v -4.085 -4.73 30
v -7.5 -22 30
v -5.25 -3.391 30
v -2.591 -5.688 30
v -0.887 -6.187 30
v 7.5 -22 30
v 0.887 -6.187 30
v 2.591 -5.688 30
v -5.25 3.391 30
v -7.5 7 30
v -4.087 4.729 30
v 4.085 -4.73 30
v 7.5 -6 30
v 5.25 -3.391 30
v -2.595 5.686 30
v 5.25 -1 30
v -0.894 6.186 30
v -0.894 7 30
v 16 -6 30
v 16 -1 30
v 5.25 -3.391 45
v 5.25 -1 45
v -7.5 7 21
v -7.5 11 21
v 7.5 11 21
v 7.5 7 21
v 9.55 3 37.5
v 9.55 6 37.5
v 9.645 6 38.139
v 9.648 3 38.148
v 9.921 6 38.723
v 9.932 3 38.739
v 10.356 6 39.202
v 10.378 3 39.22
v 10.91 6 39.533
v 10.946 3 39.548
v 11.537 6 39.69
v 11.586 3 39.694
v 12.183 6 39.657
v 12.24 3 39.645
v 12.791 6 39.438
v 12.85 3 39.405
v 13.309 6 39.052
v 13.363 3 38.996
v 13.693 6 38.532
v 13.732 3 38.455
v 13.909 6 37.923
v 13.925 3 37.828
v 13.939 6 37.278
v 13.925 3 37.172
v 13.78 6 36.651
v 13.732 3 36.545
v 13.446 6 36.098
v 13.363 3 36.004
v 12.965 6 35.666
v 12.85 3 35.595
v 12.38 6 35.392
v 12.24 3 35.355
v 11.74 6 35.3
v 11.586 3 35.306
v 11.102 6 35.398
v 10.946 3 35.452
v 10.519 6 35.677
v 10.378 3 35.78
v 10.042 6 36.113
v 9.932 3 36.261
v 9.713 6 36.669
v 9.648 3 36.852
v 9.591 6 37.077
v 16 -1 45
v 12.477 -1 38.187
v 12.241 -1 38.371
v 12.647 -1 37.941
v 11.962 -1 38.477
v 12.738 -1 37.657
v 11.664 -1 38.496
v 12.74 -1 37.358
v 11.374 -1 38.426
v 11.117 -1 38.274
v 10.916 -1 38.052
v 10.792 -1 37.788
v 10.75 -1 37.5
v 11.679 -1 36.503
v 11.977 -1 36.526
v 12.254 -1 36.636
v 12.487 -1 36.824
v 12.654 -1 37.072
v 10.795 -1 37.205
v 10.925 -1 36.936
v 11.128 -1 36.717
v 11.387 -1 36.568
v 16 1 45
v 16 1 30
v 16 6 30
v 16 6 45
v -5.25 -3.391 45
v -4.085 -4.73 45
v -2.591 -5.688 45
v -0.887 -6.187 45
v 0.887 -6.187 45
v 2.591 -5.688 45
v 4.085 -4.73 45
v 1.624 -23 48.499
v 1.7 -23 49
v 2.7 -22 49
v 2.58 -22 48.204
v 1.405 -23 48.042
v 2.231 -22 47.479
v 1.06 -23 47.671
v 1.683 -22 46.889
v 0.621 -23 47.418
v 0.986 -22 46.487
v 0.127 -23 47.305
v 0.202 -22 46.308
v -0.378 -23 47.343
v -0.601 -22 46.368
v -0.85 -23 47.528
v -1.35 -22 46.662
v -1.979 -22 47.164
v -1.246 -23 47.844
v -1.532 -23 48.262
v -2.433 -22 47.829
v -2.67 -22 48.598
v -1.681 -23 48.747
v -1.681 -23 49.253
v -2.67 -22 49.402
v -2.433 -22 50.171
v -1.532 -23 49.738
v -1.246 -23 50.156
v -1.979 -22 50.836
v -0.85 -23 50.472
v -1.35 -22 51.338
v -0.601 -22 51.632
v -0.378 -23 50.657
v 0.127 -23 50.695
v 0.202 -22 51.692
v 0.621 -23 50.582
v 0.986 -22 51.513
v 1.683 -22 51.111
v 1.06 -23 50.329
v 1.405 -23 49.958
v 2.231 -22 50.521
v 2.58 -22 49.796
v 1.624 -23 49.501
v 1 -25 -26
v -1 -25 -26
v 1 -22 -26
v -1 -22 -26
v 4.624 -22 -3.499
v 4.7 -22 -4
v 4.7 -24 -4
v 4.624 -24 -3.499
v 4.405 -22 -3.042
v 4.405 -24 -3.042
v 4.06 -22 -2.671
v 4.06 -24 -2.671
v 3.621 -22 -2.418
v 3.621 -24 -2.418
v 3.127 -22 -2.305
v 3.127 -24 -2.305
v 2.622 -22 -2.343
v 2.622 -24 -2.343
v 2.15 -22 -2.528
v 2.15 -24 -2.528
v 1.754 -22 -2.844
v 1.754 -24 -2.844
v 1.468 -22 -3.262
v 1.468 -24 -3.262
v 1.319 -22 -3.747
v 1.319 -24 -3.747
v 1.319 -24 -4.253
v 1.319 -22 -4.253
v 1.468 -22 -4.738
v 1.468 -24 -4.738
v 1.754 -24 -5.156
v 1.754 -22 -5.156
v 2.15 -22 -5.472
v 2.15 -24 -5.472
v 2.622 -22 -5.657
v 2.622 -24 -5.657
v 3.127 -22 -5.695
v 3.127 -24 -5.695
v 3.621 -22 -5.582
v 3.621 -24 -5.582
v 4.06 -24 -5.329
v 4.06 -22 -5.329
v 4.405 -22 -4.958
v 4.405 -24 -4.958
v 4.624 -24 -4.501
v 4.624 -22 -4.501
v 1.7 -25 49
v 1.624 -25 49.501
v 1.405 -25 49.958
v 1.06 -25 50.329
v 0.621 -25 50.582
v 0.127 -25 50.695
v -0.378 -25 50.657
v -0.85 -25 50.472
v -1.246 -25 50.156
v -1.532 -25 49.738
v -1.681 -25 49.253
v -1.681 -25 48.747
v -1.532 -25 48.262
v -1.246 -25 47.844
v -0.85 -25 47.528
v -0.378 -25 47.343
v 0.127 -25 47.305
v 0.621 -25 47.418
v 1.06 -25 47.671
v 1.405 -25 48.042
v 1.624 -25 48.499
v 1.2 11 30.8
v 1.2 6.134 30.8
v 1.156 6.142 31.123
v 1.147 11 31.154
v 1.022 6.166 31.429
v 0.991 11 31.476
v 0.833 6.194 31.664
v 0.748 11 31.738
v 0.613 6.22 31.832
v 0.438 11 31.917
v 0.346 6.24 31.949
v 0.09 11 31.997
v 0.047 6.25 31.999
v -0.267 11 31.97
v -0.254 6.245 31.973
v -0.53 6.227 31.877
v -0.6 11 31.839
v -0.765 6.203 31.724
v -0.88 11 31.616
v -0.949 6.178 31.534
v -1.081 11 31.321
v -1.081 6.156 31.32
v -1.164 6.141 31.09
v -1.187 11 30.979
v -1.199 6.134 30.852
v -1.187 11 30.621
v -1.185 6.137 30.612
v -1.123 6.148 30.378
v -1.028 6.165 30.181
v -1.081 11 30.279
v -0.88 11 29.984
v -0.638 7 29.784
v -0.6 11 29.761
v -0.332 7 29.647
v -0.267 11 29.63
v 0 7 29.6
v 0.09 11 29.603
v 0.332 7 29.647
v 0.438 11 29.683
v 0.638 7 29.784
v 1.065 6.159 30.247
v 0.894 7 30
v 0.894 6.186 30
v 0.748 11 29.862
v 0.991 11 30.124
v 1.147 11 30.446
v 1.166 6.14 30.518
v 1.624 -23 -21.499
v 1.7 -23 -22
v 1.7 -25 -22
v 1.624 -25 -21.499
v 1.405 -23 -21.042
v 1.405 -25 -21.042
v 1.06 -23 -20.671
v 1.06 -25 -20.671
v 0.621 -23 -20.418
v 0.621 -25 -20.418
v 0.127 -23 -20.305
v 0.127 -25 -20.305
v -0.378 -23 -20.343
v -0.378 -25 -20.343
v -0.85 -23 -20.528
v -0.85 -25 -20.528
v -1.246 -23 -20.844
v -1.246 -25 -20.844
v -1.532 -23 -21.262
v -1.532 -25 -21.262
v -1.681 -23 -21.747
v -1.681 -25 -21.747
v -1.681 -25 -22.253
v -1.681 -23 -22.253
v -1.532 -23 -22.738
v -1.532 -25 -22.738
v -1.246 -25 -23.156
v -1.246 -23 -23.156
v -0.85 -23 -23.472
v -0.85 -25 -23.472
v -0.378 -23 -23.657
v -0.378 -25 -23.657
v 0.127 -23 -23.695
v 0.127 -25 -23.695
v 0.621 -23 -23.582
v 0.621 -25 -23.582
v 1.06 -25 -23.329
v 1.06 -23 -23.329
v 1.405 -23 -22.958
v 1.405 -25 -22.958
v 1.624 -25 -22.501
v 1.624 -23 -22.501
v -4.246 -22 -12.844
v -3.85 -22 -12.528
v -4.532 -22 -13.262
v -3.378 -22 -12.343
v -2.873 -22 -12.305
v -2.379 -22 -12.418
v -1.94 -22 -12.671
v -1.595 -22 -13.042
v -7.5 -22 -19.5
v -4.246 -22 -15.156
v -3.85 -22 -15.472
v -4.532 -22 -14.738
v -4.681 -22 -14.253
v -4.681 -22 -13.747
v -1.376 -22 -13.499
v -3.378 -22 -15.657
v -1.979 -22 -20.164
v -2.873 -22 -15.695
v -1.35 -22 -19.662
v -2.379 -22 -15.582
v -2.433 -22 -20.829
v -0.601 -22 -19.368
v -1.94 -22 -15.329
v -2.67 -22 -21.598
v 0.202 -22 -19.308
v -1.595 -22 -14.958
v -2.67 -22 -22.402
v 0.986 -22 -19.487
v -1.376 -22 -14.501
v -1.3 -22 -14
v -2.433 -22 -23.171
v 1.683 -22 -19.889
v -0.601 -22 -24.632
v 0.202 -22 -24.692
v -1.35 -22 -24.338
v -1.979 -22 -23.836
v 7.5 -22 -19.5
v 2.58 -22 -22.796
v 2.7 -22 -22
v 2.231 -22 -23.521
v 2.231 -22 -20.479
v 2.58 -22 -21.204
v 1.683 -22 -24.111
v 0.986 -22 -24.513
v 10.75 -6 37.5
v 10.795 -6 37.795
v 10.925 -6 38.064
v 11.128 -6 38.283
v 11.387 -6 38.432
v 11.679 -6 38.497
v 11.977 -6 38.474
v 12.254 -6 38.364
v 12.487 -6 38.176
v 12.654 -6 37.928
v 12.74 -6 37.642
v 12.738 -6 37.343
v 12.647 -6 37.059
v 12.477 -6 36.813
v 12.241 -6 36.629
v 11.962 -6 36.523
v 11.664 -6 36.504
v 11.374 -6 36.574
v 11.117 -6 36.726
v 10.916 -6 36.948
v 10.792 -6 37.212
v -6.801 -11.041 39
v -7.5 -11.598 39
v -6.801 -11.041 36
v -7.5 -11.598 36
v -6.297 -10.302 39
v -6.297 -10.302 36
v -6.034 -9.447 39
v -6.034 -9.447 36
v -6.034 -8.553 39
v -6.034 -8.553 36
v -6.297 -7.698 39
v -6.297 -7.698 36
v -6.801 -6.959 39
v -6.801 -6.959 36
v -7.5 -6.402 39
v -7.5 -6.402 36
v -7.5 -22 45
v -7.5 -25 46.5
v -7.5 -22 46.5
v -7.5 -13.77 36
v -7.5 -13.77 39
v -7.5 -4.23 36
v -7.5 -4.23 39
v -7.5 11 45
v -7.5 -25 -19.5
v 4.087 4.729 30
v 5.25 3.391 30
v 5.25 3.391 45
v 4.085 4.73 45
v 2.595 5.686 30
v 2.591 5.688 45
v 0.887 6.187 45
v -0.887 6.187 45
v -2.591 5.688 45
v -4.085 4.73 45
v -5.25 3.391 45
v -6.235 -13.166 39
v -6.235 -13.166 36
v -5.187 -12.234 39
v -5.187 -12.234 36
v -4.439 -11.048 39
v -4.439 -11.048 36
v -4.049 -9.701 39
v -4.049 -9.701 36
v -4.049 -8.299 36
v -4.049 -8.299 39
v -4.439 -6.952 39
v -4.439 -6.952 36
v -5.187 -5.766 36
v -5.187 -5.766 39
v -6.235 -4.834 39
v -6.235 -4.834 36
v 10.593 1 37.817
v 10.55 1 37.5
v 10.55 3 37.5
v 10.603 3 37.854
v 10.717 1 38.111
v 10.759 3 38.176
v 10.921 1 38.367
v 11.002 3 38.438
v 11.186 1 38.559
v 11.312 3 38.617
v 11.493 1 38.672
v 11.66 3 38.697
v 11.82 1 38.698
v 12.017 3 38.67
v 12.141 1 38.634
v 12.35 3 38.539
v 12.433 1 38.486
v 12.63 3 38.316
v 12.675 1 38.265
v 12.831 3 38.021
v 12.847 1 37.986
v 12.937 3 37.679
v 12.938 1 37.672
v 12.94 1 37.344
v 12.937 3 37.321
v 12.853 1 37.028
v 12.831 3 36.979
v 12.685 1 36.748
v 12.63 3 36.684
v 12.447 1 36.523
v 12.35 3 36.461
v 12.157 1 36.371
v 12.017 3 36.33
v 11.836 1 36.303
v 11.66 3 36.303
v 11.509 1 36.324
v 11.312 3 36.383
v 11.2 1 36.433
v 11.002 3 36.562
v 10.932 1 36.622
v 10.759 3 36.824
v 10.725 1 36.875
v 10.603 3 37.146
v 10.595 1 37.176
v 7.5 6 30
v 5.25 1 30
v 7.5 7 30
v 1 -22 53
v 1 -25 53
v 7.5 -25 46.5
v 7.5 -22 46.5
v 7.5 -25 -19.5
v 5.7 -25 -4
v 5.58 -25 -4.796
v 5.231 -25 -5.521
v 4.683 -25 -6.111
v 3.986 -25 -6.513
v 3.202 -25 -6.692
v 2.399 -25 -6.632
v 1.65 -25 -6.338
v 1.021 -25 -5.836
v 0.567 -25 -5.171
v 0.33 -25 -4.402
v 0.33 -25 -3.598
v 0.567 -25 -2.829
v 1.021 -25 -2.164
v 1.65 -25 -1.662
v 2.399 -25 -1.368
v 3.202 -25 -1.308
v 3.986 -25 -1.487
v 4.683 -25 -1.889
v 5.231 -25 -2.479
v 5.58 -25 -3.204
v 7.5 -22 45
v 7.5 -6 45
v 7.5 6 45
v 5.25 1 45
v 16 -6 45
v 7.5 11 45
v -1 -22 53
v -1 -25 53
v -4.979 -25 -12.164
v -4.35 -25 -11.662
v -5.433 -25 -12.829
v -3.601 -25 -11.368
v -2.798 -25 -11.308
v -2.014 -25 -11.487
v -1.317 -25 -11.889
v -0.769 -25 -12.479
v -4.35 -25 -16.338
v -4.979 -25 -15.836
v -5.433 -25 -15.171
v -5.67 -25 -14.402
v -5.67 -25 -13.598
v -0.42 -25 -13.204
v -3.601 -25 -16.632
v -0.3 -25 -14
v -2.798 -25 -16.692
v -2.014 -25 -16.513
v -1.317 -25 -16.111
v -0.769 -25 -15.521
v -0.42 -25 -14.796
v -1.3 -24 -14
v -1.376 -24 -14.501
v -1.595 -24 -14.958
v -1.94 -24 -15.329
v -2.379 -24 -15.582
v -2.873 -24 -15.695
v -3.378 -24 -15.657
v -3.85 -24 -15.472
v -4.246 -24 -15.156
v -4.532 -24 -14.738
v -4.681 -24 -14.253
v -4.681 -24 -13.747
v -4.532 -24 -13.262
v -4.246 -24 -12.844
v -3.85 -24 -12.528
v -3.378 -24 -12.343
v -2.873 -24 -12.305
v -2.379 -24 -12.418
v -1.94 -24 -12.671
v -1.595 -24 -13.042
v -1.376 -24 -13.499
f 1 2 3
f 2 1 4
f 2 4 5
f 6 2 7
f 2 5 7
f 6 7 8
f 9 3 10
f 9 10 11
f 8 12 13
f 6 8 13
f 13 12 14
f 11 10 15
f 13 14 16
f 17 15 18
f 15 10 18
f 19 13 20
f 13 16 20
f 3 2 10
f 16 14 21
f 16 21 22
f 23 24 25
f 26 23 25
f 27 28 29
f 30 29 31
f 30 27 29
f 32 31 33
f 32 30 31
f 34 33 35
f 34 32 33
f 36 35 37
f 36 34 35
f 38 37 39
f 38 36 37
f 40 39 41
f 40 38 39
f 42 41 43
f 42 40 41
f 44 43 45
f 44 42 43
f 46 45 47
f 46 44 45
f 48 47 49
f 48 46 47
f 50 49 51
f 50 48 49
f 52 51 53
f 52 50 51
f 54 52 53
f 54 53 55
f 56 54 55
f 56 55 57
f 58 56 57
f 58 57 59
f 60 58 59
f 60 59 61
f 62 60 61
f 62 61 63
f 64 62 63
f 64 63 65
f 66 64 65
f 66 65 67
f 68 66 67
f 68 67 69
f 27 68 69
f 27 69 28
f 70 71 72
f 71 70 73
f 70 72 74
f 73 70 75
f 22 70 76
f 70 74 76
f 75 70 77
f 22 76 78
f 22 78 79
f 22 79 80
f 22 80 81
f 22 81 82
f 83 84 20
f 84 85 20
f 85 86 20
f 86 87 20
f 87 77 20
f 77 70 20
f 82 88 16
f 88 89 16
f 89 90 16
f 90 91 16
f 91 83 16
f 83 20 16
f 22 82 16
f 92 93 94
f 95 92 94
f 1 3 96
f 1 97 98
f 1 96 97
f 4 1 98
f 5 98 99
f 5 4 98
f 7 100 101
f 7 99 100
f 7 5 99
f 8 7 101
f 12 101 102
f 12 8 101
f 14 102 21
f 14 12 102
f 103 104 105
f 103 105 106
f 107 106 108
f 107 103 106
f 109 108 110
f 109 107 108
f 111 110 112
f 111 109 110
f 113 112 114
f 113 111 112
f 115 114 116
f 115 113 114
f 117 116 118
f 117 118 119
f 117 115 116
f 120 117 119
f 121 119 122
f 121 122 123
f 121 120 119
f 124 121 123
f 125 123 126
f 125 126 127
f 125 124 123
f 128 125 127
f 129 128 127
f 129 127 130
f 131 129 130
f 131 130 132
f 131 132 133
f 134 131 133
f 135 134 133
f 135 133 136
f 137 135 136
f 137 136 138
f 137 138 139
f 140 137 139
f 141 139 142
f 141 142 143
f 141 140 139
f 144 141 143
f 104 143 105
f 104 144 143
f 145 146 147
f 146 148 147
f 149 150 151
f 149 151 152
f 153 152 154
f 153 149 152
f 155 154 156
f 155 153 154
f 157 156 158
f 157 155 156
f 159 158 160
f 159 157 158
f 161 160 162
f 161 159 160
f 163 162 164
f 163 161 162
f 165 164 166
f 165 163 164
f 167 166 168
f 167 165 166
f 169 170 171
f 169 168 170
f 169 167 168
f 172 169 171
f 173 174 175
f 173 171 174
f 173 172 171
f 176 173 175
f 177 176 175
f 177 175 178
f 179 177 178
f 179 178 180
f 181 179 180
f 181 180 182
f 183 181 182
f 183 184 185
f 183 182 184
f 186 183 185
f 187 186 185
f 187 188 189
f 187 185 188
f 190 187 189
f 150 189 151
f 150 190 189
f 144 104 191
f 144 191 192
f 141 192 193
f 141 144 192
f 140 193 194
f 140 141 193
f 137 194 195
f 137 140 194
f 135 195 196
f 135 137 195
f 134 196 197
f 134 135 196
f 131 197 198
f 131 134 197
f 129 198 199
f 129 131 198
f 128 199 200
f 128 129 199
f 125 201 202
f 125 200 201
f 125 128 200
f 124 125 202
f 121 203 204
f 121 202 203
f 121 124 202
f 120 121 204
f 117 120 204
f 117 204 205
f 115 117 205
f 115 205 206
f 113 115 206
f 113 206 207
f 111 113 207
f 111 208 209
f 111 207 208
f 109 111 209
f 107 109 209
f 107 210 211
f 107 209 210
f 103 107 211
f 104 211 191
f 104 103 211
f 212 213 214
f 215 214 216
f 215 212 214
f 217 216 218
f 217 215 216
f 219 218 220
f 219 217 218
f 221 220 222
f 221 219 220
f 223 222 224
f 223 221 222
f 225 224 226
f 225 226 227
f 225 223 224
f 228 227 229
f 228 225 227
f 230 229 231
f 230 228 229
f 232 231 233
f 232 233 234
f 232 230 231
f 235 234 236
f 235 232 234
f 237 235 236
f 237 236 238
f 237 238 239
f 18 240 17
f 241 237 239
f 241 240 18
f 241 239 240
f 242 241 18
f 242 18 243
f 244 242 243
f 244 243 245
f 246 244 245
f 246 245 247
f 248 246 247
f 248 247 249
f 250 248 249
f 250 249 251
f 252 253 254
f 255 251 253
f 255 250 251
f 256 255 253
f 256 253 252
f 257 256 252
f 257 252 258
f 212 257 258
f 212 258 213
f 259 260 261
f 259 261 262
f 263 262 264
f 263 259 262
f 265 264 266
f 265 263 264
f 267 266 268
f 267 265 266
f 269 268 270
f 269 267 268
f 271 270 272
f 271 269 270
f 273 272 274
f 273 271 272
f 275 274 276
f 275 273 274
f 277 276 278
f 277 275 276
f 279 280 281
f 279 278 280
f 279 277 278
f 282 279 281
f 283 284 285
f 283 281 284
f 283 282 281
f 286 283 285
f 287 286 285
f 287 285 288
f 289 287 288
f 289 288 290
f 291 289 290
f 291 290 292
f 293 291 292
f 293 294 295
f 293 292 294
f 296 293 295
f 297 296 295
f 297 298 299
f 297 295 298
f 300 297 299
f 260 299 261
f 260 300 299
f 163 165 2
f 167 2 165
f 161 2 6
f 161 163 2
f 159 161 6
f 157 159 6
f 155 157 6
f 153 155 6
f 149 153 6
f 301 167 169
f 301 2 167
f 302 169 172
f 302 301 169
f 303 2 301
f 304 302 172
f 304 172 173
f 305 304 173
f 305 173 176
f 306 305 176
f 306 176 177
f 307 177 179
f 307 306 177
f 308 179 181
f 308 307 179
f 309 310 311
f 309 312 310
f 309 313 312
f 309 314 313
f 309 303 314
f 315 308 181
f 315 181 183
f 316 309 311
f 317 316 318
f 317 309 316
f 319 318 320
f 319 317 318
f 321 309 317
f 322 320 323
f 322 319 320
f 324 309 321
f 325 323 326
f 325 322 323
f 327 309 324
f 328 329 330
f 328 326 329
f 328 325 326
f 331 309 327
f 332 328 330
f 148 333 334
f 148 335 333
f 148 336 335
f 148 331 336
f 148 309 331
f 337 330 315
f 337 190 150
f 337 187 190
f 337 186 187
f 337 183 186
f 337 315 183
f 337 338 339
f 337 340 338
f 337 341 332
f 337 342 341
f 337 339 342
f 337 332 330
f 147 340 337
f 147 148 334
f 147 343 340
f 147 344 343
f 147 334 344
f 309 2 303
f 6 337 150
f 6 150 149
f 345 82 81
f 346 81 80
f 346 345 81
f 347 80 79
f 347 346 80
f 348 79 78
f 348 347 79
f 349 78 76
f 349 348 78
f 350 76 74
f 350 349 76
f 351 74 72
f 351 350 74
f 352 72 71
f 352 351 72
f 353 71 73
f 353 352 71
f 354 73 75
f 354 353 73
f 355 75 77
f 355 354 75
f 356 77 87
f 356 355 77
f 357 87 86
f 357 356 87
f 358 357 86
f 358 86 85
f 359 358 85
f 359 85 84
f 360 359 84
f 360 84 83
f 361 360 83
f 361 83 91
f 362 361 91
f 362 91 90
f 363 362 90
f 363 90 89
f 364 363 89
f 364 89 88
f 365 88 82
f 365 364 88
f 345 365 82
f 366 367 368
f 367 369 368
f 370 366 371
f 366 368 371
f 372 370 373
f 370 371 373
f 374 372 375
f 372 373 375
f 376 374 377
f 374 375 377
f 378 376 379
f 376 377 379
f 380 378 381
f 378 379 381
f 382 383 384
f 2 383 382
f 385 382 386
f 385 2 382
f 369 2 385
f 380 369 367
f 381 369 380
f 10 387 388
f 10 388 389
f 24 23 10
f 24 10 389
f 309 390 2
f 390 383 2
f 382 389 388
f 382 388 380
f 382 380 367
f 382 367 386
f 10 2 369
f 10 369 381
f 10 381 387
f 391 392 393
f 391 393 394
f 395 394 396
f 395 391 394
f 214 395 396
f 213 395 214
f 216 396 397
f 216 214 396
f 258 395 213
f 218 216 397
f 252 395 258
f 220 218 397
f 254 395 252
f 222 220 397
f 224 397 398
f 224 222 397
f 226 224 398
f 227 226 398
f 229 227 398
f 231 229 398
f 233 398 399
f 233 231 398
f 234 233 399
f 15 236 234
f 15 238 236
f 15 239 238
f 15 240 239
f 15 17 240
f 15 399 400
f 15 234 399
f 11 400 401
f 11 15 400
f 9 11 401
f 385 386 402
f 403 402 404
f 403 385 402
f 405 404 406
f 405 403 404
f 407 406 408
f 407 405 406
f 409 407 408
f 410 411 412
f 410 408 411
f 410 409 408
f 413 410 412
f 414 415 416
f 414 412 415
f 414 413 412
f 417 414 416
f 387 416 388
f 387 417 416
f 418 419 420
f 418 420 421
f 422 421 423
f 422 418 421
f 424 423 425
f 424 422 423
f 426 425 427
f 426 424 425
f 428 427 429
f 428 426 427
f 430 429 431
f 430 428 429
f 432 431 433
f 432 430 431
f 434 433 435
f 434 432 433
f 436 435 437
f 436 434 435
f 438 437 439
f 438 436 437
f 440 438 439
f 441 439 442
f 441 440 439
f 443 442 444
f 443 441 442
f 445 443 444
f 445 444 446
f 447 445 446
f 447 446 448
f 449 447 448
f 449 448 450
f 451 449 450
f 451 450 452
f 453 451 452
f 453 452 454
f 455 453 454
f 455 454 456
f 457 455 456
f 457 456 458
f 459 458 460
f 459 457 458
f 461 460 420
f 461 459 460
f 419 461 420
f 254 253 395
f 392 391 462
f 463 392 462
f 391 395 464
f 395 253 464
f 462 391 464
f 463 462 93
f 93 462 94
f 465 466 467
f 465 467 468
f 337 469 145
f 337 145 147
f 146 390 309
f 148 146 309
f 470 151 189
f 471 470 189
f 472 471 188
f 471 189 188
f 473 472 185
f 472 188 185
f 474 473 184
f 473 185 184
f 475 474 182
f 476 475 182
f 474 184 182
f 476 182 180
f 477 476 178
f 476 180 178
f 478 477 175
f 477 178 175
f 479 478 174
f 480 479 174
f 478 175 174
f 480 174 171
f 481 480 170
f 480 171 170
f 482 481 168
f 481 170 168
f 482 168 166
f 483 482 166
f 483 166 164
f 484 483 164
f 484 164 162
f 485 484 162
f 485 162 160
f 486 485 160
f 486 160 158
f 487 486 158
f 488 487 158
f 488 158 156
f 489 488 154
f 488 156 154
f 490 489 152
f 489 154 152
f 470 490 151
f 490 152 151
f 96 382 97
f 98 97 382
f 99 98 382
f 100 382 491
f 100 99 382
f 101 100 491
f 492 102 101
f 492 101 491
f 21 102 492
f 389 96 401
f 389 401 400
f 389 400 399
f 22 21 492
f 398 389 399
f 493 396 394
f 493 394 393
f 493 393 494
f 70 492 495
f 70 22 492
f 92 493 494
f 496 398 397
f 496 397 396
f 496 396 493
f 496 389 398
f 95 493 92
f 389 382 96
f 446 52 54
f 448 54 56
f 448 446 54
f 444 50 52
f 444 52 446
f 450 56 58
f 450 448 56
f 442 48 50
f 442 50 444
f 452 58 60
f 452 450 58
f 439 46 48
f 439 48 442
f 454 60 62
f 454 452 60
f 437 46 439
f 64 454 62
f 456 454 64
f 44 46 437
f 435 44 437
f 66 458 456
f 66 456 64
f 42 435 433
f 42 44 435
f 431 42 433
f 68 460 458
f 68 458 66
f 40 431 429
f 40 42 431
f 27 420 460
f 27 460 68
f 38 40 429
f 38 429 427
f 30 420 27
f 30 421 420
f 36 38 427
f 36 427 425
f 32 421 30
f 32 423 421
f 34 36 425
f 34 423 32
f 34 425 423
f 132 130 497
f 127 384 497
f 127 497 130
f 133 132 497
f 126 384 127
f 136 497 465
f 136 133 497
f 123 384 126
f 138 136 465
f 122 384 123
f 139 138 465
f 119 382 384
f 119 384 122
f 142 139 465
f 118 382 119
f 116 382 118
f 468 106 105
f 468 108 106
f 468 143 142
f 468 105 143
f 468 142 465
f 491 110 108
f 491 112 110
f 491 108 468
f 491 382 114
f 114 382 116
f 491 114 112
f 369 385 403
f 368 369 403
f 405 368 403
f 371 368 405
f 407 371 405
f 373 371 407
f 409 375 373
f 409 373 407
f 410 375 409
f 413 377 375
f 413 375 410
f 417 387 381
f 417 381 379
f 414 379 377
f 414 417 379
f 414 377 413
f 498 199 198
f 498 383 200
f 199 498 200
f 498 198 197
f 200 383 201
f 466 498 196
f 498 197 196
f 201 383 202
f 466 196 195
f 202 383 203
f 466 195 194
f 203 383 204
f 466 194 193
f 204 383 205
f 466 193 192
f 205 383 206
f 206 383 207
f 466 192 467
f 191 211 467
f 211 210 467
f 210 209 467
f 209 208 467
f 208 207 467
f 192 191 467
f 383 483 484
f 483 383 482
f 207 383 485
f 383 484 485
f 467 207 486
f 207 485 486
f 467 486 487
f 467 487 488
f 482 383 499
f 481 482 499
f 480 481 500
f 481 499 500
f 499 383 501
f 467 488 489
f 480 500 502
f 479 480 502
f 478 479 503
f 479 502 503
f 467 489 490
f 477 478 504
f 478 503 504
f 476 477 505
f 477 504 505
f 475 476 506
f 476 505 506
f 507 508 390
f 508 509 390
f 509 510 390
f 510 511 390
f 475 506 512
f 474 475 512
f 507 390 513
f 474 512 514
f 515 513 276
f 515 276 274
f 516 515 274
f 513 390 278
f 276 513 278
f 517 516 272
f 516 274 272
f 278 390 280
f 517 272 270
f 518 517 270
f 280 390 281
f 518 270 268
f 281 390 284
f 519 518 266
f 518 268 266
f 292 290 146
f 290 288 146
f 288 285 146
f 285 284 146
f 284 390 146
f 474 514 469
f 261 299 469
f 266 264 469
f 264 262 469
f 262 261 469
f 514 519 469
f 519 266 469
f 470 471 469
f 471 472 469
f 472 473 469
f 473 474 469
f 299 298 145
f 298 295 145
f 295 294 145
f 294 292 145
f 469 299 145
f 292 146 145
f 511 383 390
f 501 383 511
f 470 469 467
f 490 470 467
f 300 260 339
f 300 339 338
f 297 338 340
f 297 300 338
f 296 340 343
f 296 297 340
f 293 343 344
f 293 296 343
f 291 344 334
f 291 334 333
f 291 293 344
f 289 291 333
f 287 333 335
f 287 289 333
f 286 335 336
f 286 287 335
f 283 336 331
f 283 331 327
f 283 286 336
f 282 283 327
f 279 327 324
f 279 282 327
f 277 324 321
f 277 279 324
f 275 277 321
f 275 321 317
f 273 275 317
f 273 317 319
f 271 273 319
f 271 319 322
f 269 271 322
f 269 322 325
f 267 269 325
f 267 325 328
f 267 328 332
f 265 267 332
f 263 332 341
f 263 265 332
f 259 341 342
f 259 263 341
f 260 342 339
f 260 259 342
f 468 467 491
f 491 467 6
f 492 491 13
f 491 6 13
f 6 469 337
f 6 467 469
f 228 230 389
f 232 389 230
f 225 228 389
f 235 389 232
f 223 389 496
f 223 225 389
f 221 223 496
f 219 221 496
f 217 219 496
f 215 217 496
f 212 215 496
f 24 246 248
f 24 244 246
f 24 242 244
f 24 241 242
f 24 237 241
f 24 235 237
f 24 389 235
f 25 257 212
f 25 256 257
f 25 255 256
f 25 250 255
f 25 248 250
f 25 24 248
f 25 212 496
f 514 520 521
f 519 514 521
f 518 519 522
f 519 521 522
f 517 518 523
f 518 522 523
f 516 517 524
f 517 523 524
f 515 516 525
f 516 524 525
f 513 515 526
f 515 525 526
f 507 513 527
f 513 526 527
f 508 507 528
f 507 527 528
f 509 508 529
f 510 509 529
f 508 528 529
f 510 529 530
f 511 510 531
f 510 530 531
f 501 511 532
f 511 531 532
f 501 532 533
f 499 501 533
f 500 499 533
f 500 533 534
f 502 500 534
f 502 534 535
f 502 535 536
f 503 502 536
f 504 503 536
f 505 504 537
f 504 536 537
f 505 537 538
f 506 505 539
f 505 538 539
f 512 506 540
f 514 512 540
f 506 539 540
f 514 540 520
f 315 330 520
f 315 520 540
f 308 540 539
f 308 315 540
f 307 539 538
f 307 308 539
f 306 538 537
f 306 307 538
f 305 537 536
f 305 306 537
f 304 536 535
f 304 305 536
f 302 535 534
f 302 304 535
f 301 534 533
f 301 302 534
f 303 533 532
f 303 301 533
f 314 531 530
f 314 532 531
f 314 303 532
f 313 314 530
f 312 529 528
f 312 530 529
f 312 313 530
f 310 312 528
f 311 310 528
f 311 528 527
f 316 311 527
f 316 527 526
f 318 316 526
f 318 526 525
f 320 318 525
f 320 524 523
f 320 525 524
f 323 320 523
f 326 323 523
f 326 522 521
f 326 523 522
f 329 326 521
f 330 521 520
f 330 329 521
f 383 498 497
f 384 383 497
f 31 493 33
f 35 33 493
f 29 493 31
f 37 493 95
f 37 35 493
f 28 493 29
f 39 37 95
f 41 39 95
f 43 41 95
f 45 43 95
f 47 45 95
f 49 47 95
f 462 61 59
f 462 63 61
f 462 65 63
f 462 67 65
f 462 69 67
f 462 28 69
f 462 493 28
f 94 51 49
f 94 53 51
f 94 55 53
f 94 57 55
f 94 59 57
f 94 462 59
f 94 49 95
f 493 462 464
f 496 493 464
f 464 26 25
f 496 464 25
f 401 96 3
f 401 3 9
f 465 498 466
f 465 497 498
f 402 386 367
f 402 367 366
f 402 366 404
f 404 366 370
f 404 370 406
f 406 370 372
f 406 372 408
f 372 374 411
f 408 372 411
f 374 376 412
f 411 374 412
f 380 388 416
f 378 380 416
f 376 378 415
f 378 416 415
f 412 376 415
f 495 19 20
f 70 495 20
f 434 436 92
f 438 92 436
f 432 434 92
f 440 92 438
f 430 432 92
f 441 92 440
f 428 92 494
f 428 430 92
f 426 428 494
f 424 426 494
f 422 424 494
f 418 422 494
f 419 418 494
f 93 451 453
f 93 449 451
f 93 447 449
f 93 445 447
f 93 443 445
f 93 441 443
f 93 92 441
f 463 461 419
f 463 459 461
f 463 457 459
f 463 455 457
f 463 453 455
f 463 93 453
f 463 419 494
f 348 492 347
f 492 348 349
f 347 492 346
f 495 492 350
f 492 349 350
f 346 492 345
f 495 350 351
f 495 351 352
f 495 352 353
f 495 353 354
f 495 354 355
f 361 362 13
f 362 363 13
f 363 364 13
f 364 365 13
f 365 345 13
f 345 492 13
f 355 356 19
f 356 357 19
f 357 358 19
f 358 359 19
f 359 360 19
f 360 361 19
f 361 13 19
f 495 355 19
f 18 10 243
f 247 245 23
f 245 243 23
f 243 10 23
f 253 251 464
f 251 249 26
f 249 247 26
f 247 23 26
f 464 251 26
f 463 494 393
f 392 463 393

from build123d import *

# Parameters (mm, degrees)
CYLINDER099_R               = 3
CYLINDER099_DEPTH           = 3
CYLINDER098_R               = 5
CYLINDER098_DEPTH           = 3
CYLINDER090_R               = 1.2
CYLINDER090_DEPTH           = 13
CYLINDER091_R               = 1
CYLINDER091_DEPTH           = 12
CYLINDER091_ROLL_ANGLE      = 89.999919
CYLINDER091_PITCH_ANGLE     = -3.6e-05
CYLINDER091_PLACEMENT_ANGLE = 179.999964
CYLINDER069_R               = 2.2
CYLINDER069_DEPTH           = 12
CYLINDER069_ROLL_ANGLE      = 89.999919
CYLINDER069_PITCH_ANGLE     = -3.6e-05
CYLINDER069_PLACEMENT_ANGLE = 179.999964
CYLINDER068_R               = 1.2
CYLINDER068_DEPTH           = 12
CYLINDER068_ROLL_ANGLE      = 89.999919
CYLINDER068_PITCH_ANGLE     = -3.6e-05
CYLINDER068_PLACEMENT_ANGLE = 179.999964
BOX406016_W                 = 49
BOX406016_H                 = 2
BOX406016_DEPTH             = 32
BOX406008016_W              = 9
BOX406008016_H              = 12
BOX406008016_DEPTH          = 15
BOX406017_W                 = 16
BOX406017_H                 = 10.5
BOX406017_DEPTH             = 28
CYLINDER067_R               = 6.25
CYLINDER067_DEPTH           = 26
COMMON004_PLACEMENT_ANGLE   = 90
BOX406008015_W              = 15
BOX406008015_H              = 31
BOX406008015_DEPTH          = 15
BOX406008017_W              = 15
BOX406008017_H              = 4
BOX406008017_DEPTH          = 24
CYLINDER096_R               = 1.7
CYLINDER096_DEPTH           = 21
BOX_W                       = 15
BOX_H                       = 3
BOX_DEPTH                   = 8
CYLINDER097_R               = 1.7
CYLINDER097_DEPTH           = 21
BOX406008018_W              = 15
BOX406008018_H              = 3
BOX406008018_DEPTH          = 8
CHAMFER005_SIZE             = 1
CYLINDER093_R               = 1.7
CYLINDER093_DEPTH           = 21
CYLINDER092_R               = 1.7
CYLINDER092_DEPTH           = 21
BOX406008014_W              = 15
BOX406008014_H              = 3
BOX406008014_DEPTH          = 63
CHAMFER006_SIZE             = 1
CHAMFER007_SIZE             = 6.5


with BuildPart() as cylinder099:
    # Cylinder099 → Cylinder099 (new body)
    with BuildSketch(Plane(origin=(-9, -9, 36), x_dir=(1, 0, 0), z_dir=(0, 0, 1))):
        Circle(CYLINDER099_R)
    extrude(amount=CYLINDER099_DEPTH)


with BuildPart() as cut081:
    # Cylinder098 → Cylinder098 (new body)
    with BuildSketch(Plane(origin=(-9, -9, 36), x_dir=(1, 0, 0), z_dir=(0, 0, 1))):
        Circle(CYLINDER098_R)
    extrude(amount=CYLINDER098_DEPTH)

    # Cut081: cut Cylinder099
    add(cylinder099.part, mode=Mode.SUBTRACT)


with BuildPart() as cylinder084:
    # Cylinder090 → Cylinder090 (new body)
    with BuildSketch(Plane(origin=(0, 16, 35.8), x_dir=(1, 0, 0), z_dir=(0, -1, 0))):
        Circle(CYLINDER090_R)
    extrude(amount=CYLINDER090_DEPTH)


with BuildPart() as cylinder091:
    # Cylinder091 → Cylinder091 (new body)
    with BuildSketch(Plane.XY):
        Circle(CYLINDER091_R)
    extrude(amount=CYLINDER091_DEPTH)


with BuildPart() as cylinder091_1:
    # Cylinder091 roll: moved
    add(cylinder091.part.rotate(Axis((0, 0, 0), (1, 0, 0)), CYLINDER091_ROLL_ANGLE))


with BuildPart() as cylinder091_2:
    # Cylinder091 pitch: moved
    add(cylinder091_1.part.rotate(Axis((0, 0, 0), (0, 1, 0)), CYLINDER091_PITCH_ANGLE))


with BuildPart() as cylinder091_3:
    # Cylinder091 placement: moved
    add(cylinder091_2.part.moved(Location((11.75, -12, 42.5))).rotate(Axis((11.75, -12, 42.5), (0, 0, 1)), CYLINDER091_PLACEMENT_ANGLE))


with BuildPart() as cylinder069:
    # Cylinder069 → Cylinder069 (new body)
    with BuildSketch(Plane.XY):
        Circle(CYLINDER069_R)
    extrude(amount=CYLINDER069_DEPTH)


with BuildPart() as cylinder069_1:
    # Cylinder069 roll: moved
    add(cylinder069.part.rotate(Axis((0, 0, 0), (1, 0, 0)), CYLINDER069_ROLL_ANGLE))


with BuildPart() as cylinder069_2:
    # Cylinder069 pitch: moved
    add(cylinder069_1.part.rotate(Axis((0, 0, 0), (0, 1, 0)), CYLINDER069_PITCH_ANGLE))


with BuildPart() as cylinder069_3:
    # Cylinder069 placement: moved
    add(cylinder069_2.part.moved(Location((11.75, 3, 42.5))).rotate(Axis((11.75, 3, 42.5), (0, 0, 1)), CYLINDER069_PLACEMENT_ANGLE))


with BuildPart() as fusion103077013004017011:
    # Cylinder068 → Cylinder068 (new body)
    with BuildSketch(Plane.XY):
        Circle(CYLINDER068_R)
    extrude(amount=CYLINDER068_DEPTH)


with BuildPart() as fusion103077013004017011_1:
    # Cylinder068 roll: moved
    add(fusion103077013004017011.part.rotate(Axis((0, 0, 0), (1, 0, 0)), CYLINDER068_ROLL_ANGLE))


with BuildPart() as fusion103077013004017011_2:
    # Cylinder068 pitch: moved
    add(fusion103077013004017011_1.part.rotate(Axis((0, 0, 0), (0, 1, 0)), CYLINDER068_PITCH_ANGLE))


with BuildPart() as fusion103077013004017011_3:
    # Cylinder068 placement: moved
    add(fusion103077013004017011_2.part.moved(Location((11.75, 0, 42.5))).rotate(Axis((11.75, 0, 42.5), (0, 0, 1)), CYLINDER068_PLACEMENT_ANGLE))

    # Fusion103077013: union Cylinder069
    add(cylinder069_3.part)

    # Fusion103077013004017011: union Cylinder091
    add(cylinder091_3.part)


with BuildPart() as clamp_slot:
    # Box406016 → Box406016 (new body)
    with BuildSketch(Plane(origin=(48.48, 1, 22), x_dir=(-1, 0, 0), z_dir=(0, 0, 1))):
        with Locations((24.5, 1)):
            Rectangle(BOX406016_W, BOX406016_H)
    extrude(amount=BOX406016_DEPTH)


with BuildPart() as cube351:
    # Box406008016 → Box406008016 (new body)
    with BuildSketch(Plane(origin=(7, -6, 35), x_dir=(1, 0, 0), z_dir=(0, 0, 1))):
        with Locations((4.5, 6)):
            Rectangle(BOX406008016_W, BOX406008016_H)
    extrude(amount=BOX406008016_DEPTH)


with BuildPart() as gearbox001:
    # Box406017 → Box406017 (new body)
    with BuildSketch(Plane(origin=(-8, -5.25, 18), x_dir=(1, 0, 0), z_dir=(0, 0, 1))):
        with Locations((8, 5.25)):
            Rectangle(BOX406017_W, BOX406017_H)
    extrude(amount=BOX406017_DEPTH)


with BuildPart() as motor_hole:
    # Cylinder067 → Cylinder067 (new body)
    with BuildSketch(Plane.XY.offset(20)):
        Circle(CYLINDER067_R)
    extrude(amount=CYLINDER067_DEPTH)

    # Common004: intersect gearbox001
    add(gearbox001.part, mode=Mode.INTERSECT)


with BuildPart() as motor_hole_1:
    # Common004 placement: moved
    add(motor_hole.part.moved(Location((0, 0, 5))).rotate(Axis((0, 0, 5), (0, 0, 1)), COMMON004_PLACEMENT_ANGLE))


with BuildPart() as cut075:
    # Box406008015 → Box406008015 (new body)
    with BuildSketch(Plane(origin=(-7.5, -22, 35), x_dir=(1, 0, 0), z_dir=(0, 0, 1))):
        with Locations((7.5, 15.5)):
            Rectangle(BOX406008015_W, BOX406008015_H)
    extrude(amount=BOX406008015_DEPTH)

    # Cut073: cut motor-hole
    add(motor_hole_1.part, mode=Mode.SUBTRACT)

    # Fusion103077013004017010: union Cube351
    add(cube351.part)

    # Cut074: cut clamp-slot
    add(clamp_slot.part, mode=Mode.SUBTRACT)

    # Cut075: cut Fusion103077013004017011
    add(fusion103077013004017011_3.part, mode=Mode.SUBTRACT)


with BuildPart() as cut082:
    # Box406008017 → Box406008017 (new body)
    with BuildSketch(Plane(origin=(-7.5, 7, 26), x_dir=(1, 0, 0), z_dir=(0, 0, 1))):
        with Locations((7.5, 2)):
            Rectangle(BOX406008017_W, BOX406008017_H)
    extrude(amount=BOX406008017_DEPTH)

    # Fusion103077013004017012: union Cut075
    add(cut075.part)

    # Cut076: cut Cylinder084
    add(cylinder084.part, mode=Mode.SUBTRACT)


with BuildPart() as cut082_1:
    # Cut076 placement: moved
    add(cut082.part.moved(Location((0, 0, -5))))

    # Cut082: cut Cut081
    add(cut081.part, mode=Mode.SUBTRACT)


with BuildPart() as cylinder096:
    # Cylinder096 → Cylinder096 (new body)
    with BuildSketch(Plane(origin=(0, -13, 49), x_dir=(1, 0, 0), z_dir=(0, -1, 0))):
        Circle(CYLINDER096_R)
    extrude(amount=CYLINDER096_DEPTH)


with BuildPart() as cut080:
    # Box → Box (new body)
    with BuildSketch(Plane(origin=(-7.5, -25, 45), x_dir=(1, 0, 0), z_dir=(0, 0, 1))):
        with Locations((7.5, 1.5)):
            Rectangle(BOX_W, BOX_H)
    extrude(amount=BOX_DEPTH)

    # Cut080: cut Cylinder096
    add(cylinder096.part, mode=Mode.SUBTRACT)


with BuildPart() as cylinder097:
    # Cylinder097 → Cylinder097 (new body)
    with BuildSketch(Plane(origin=(0, -13, -22), x_dir=(1, 0, 0), z_dir=(0, -1, 0))):
        Circle(CYLINDER097_R)
    extrude(amount=CYLINDER097_DEPTH)


with BuildPart() as chamfer005:
    # Box406008018 → Box406008018 (new body)
    with BuildSketch(Plane(origin=(-7.5, -25, -26), x_dir=(1, 0, 0), z_dir=(0, 0, 1))):
        with Locations((7.5, 1.5)):
            Rectangle(BOX406008018_W, BOX406008018_H)
    extrude(amount=BOX406008018_DEPTH)

    # Cut079: cut Cylinder097
    add(cylinder097.part, mode=Mode.SUBTRACT)

    # Fusion103077013004017015: union Cut080
    add(cut080.part)

    # Chamfer005
    chamfer005_edges = [chamfer005.edges().sort_by_distance(p)[0] for p in [
        (-1.7, -22, -22),
        (-1.7, -22, 49),
    ]]
    chamfer(chamfer005_edges, length=CHAMFER005_SIZE)


with BuildPart() as cylinder093:
    # Cylinder093 → Cylinder093 (new body)
    with BuildSketch(Plane(origin=(3, -13, -4), x_dir=(1, 0, 0), z_dir=(0, -1, 0))):
        Circle(CYLINDER093_R)
    extrude(amount=CYLINDER093_DEPTH)


with BuildPart() as fusion103077013004017013:
    # Cylinder092 → Cylinder092 (new body)
    with BuildSketch(Plane(origin=(-3, -13, -14), x_dir=(1, 0, 0), z_dir=(0, -1, 0))):
        Circle(CYLINDER092_R)
    extrude(amount=CYLINDER092_DEPTH)

    # Fusion103077013004017013: union Cylinder093
    add(cylinder093.part)


with BuildPart() as fusion103077013004017017:
    # Box406008014 → Box406008014 (new body)
    with BuildSketch(Plane(origin=(-7.5, -25, -18), x_dir=(1, 0, 0), z_dir=(0, 0, 1))):
        with Locations((7.5, 1.5)):
            Rectangle(BOX406008014_W, BOX406008014_H)
    extrude(amount=BOX406008014_DEPTH)

    # Cut077: cut Fusion103077013004017013
    add(fusion103077013004017013.part, mode=Mode.SUBTRACT)

    # Chamfer006
    chamfer006_edges = [fusion103077013004017017.edges().sort_by_distance(p)[0] for p in [
        (-4.7, -25, -14),
        (1.3, -25, -4),
    ]]
    chamfer(chamfer006_edges, length=CHAMFER006_SIZE)

    # Fusion103077013004017016: union Chamfer005
    add(chamfer005.part)

    # Chamfer007
    chamfer007_edges = [fusion103077013004017017.edges().sort_by_distance(p)[0] for p in [
        (-7.5, -23.5, -26),
        (7.5, -23.5, -26),
        (7.5, -23.5, 53),
        (-7.5, -23.5, 53),
    ]]
    chamfer(chamfer007_edges, length=CHAMFER007_SIZE)

    # Fusion103077013004017017: union Cut082
    add(cut082_1.part)


solid = fusion103077013004017017.part
